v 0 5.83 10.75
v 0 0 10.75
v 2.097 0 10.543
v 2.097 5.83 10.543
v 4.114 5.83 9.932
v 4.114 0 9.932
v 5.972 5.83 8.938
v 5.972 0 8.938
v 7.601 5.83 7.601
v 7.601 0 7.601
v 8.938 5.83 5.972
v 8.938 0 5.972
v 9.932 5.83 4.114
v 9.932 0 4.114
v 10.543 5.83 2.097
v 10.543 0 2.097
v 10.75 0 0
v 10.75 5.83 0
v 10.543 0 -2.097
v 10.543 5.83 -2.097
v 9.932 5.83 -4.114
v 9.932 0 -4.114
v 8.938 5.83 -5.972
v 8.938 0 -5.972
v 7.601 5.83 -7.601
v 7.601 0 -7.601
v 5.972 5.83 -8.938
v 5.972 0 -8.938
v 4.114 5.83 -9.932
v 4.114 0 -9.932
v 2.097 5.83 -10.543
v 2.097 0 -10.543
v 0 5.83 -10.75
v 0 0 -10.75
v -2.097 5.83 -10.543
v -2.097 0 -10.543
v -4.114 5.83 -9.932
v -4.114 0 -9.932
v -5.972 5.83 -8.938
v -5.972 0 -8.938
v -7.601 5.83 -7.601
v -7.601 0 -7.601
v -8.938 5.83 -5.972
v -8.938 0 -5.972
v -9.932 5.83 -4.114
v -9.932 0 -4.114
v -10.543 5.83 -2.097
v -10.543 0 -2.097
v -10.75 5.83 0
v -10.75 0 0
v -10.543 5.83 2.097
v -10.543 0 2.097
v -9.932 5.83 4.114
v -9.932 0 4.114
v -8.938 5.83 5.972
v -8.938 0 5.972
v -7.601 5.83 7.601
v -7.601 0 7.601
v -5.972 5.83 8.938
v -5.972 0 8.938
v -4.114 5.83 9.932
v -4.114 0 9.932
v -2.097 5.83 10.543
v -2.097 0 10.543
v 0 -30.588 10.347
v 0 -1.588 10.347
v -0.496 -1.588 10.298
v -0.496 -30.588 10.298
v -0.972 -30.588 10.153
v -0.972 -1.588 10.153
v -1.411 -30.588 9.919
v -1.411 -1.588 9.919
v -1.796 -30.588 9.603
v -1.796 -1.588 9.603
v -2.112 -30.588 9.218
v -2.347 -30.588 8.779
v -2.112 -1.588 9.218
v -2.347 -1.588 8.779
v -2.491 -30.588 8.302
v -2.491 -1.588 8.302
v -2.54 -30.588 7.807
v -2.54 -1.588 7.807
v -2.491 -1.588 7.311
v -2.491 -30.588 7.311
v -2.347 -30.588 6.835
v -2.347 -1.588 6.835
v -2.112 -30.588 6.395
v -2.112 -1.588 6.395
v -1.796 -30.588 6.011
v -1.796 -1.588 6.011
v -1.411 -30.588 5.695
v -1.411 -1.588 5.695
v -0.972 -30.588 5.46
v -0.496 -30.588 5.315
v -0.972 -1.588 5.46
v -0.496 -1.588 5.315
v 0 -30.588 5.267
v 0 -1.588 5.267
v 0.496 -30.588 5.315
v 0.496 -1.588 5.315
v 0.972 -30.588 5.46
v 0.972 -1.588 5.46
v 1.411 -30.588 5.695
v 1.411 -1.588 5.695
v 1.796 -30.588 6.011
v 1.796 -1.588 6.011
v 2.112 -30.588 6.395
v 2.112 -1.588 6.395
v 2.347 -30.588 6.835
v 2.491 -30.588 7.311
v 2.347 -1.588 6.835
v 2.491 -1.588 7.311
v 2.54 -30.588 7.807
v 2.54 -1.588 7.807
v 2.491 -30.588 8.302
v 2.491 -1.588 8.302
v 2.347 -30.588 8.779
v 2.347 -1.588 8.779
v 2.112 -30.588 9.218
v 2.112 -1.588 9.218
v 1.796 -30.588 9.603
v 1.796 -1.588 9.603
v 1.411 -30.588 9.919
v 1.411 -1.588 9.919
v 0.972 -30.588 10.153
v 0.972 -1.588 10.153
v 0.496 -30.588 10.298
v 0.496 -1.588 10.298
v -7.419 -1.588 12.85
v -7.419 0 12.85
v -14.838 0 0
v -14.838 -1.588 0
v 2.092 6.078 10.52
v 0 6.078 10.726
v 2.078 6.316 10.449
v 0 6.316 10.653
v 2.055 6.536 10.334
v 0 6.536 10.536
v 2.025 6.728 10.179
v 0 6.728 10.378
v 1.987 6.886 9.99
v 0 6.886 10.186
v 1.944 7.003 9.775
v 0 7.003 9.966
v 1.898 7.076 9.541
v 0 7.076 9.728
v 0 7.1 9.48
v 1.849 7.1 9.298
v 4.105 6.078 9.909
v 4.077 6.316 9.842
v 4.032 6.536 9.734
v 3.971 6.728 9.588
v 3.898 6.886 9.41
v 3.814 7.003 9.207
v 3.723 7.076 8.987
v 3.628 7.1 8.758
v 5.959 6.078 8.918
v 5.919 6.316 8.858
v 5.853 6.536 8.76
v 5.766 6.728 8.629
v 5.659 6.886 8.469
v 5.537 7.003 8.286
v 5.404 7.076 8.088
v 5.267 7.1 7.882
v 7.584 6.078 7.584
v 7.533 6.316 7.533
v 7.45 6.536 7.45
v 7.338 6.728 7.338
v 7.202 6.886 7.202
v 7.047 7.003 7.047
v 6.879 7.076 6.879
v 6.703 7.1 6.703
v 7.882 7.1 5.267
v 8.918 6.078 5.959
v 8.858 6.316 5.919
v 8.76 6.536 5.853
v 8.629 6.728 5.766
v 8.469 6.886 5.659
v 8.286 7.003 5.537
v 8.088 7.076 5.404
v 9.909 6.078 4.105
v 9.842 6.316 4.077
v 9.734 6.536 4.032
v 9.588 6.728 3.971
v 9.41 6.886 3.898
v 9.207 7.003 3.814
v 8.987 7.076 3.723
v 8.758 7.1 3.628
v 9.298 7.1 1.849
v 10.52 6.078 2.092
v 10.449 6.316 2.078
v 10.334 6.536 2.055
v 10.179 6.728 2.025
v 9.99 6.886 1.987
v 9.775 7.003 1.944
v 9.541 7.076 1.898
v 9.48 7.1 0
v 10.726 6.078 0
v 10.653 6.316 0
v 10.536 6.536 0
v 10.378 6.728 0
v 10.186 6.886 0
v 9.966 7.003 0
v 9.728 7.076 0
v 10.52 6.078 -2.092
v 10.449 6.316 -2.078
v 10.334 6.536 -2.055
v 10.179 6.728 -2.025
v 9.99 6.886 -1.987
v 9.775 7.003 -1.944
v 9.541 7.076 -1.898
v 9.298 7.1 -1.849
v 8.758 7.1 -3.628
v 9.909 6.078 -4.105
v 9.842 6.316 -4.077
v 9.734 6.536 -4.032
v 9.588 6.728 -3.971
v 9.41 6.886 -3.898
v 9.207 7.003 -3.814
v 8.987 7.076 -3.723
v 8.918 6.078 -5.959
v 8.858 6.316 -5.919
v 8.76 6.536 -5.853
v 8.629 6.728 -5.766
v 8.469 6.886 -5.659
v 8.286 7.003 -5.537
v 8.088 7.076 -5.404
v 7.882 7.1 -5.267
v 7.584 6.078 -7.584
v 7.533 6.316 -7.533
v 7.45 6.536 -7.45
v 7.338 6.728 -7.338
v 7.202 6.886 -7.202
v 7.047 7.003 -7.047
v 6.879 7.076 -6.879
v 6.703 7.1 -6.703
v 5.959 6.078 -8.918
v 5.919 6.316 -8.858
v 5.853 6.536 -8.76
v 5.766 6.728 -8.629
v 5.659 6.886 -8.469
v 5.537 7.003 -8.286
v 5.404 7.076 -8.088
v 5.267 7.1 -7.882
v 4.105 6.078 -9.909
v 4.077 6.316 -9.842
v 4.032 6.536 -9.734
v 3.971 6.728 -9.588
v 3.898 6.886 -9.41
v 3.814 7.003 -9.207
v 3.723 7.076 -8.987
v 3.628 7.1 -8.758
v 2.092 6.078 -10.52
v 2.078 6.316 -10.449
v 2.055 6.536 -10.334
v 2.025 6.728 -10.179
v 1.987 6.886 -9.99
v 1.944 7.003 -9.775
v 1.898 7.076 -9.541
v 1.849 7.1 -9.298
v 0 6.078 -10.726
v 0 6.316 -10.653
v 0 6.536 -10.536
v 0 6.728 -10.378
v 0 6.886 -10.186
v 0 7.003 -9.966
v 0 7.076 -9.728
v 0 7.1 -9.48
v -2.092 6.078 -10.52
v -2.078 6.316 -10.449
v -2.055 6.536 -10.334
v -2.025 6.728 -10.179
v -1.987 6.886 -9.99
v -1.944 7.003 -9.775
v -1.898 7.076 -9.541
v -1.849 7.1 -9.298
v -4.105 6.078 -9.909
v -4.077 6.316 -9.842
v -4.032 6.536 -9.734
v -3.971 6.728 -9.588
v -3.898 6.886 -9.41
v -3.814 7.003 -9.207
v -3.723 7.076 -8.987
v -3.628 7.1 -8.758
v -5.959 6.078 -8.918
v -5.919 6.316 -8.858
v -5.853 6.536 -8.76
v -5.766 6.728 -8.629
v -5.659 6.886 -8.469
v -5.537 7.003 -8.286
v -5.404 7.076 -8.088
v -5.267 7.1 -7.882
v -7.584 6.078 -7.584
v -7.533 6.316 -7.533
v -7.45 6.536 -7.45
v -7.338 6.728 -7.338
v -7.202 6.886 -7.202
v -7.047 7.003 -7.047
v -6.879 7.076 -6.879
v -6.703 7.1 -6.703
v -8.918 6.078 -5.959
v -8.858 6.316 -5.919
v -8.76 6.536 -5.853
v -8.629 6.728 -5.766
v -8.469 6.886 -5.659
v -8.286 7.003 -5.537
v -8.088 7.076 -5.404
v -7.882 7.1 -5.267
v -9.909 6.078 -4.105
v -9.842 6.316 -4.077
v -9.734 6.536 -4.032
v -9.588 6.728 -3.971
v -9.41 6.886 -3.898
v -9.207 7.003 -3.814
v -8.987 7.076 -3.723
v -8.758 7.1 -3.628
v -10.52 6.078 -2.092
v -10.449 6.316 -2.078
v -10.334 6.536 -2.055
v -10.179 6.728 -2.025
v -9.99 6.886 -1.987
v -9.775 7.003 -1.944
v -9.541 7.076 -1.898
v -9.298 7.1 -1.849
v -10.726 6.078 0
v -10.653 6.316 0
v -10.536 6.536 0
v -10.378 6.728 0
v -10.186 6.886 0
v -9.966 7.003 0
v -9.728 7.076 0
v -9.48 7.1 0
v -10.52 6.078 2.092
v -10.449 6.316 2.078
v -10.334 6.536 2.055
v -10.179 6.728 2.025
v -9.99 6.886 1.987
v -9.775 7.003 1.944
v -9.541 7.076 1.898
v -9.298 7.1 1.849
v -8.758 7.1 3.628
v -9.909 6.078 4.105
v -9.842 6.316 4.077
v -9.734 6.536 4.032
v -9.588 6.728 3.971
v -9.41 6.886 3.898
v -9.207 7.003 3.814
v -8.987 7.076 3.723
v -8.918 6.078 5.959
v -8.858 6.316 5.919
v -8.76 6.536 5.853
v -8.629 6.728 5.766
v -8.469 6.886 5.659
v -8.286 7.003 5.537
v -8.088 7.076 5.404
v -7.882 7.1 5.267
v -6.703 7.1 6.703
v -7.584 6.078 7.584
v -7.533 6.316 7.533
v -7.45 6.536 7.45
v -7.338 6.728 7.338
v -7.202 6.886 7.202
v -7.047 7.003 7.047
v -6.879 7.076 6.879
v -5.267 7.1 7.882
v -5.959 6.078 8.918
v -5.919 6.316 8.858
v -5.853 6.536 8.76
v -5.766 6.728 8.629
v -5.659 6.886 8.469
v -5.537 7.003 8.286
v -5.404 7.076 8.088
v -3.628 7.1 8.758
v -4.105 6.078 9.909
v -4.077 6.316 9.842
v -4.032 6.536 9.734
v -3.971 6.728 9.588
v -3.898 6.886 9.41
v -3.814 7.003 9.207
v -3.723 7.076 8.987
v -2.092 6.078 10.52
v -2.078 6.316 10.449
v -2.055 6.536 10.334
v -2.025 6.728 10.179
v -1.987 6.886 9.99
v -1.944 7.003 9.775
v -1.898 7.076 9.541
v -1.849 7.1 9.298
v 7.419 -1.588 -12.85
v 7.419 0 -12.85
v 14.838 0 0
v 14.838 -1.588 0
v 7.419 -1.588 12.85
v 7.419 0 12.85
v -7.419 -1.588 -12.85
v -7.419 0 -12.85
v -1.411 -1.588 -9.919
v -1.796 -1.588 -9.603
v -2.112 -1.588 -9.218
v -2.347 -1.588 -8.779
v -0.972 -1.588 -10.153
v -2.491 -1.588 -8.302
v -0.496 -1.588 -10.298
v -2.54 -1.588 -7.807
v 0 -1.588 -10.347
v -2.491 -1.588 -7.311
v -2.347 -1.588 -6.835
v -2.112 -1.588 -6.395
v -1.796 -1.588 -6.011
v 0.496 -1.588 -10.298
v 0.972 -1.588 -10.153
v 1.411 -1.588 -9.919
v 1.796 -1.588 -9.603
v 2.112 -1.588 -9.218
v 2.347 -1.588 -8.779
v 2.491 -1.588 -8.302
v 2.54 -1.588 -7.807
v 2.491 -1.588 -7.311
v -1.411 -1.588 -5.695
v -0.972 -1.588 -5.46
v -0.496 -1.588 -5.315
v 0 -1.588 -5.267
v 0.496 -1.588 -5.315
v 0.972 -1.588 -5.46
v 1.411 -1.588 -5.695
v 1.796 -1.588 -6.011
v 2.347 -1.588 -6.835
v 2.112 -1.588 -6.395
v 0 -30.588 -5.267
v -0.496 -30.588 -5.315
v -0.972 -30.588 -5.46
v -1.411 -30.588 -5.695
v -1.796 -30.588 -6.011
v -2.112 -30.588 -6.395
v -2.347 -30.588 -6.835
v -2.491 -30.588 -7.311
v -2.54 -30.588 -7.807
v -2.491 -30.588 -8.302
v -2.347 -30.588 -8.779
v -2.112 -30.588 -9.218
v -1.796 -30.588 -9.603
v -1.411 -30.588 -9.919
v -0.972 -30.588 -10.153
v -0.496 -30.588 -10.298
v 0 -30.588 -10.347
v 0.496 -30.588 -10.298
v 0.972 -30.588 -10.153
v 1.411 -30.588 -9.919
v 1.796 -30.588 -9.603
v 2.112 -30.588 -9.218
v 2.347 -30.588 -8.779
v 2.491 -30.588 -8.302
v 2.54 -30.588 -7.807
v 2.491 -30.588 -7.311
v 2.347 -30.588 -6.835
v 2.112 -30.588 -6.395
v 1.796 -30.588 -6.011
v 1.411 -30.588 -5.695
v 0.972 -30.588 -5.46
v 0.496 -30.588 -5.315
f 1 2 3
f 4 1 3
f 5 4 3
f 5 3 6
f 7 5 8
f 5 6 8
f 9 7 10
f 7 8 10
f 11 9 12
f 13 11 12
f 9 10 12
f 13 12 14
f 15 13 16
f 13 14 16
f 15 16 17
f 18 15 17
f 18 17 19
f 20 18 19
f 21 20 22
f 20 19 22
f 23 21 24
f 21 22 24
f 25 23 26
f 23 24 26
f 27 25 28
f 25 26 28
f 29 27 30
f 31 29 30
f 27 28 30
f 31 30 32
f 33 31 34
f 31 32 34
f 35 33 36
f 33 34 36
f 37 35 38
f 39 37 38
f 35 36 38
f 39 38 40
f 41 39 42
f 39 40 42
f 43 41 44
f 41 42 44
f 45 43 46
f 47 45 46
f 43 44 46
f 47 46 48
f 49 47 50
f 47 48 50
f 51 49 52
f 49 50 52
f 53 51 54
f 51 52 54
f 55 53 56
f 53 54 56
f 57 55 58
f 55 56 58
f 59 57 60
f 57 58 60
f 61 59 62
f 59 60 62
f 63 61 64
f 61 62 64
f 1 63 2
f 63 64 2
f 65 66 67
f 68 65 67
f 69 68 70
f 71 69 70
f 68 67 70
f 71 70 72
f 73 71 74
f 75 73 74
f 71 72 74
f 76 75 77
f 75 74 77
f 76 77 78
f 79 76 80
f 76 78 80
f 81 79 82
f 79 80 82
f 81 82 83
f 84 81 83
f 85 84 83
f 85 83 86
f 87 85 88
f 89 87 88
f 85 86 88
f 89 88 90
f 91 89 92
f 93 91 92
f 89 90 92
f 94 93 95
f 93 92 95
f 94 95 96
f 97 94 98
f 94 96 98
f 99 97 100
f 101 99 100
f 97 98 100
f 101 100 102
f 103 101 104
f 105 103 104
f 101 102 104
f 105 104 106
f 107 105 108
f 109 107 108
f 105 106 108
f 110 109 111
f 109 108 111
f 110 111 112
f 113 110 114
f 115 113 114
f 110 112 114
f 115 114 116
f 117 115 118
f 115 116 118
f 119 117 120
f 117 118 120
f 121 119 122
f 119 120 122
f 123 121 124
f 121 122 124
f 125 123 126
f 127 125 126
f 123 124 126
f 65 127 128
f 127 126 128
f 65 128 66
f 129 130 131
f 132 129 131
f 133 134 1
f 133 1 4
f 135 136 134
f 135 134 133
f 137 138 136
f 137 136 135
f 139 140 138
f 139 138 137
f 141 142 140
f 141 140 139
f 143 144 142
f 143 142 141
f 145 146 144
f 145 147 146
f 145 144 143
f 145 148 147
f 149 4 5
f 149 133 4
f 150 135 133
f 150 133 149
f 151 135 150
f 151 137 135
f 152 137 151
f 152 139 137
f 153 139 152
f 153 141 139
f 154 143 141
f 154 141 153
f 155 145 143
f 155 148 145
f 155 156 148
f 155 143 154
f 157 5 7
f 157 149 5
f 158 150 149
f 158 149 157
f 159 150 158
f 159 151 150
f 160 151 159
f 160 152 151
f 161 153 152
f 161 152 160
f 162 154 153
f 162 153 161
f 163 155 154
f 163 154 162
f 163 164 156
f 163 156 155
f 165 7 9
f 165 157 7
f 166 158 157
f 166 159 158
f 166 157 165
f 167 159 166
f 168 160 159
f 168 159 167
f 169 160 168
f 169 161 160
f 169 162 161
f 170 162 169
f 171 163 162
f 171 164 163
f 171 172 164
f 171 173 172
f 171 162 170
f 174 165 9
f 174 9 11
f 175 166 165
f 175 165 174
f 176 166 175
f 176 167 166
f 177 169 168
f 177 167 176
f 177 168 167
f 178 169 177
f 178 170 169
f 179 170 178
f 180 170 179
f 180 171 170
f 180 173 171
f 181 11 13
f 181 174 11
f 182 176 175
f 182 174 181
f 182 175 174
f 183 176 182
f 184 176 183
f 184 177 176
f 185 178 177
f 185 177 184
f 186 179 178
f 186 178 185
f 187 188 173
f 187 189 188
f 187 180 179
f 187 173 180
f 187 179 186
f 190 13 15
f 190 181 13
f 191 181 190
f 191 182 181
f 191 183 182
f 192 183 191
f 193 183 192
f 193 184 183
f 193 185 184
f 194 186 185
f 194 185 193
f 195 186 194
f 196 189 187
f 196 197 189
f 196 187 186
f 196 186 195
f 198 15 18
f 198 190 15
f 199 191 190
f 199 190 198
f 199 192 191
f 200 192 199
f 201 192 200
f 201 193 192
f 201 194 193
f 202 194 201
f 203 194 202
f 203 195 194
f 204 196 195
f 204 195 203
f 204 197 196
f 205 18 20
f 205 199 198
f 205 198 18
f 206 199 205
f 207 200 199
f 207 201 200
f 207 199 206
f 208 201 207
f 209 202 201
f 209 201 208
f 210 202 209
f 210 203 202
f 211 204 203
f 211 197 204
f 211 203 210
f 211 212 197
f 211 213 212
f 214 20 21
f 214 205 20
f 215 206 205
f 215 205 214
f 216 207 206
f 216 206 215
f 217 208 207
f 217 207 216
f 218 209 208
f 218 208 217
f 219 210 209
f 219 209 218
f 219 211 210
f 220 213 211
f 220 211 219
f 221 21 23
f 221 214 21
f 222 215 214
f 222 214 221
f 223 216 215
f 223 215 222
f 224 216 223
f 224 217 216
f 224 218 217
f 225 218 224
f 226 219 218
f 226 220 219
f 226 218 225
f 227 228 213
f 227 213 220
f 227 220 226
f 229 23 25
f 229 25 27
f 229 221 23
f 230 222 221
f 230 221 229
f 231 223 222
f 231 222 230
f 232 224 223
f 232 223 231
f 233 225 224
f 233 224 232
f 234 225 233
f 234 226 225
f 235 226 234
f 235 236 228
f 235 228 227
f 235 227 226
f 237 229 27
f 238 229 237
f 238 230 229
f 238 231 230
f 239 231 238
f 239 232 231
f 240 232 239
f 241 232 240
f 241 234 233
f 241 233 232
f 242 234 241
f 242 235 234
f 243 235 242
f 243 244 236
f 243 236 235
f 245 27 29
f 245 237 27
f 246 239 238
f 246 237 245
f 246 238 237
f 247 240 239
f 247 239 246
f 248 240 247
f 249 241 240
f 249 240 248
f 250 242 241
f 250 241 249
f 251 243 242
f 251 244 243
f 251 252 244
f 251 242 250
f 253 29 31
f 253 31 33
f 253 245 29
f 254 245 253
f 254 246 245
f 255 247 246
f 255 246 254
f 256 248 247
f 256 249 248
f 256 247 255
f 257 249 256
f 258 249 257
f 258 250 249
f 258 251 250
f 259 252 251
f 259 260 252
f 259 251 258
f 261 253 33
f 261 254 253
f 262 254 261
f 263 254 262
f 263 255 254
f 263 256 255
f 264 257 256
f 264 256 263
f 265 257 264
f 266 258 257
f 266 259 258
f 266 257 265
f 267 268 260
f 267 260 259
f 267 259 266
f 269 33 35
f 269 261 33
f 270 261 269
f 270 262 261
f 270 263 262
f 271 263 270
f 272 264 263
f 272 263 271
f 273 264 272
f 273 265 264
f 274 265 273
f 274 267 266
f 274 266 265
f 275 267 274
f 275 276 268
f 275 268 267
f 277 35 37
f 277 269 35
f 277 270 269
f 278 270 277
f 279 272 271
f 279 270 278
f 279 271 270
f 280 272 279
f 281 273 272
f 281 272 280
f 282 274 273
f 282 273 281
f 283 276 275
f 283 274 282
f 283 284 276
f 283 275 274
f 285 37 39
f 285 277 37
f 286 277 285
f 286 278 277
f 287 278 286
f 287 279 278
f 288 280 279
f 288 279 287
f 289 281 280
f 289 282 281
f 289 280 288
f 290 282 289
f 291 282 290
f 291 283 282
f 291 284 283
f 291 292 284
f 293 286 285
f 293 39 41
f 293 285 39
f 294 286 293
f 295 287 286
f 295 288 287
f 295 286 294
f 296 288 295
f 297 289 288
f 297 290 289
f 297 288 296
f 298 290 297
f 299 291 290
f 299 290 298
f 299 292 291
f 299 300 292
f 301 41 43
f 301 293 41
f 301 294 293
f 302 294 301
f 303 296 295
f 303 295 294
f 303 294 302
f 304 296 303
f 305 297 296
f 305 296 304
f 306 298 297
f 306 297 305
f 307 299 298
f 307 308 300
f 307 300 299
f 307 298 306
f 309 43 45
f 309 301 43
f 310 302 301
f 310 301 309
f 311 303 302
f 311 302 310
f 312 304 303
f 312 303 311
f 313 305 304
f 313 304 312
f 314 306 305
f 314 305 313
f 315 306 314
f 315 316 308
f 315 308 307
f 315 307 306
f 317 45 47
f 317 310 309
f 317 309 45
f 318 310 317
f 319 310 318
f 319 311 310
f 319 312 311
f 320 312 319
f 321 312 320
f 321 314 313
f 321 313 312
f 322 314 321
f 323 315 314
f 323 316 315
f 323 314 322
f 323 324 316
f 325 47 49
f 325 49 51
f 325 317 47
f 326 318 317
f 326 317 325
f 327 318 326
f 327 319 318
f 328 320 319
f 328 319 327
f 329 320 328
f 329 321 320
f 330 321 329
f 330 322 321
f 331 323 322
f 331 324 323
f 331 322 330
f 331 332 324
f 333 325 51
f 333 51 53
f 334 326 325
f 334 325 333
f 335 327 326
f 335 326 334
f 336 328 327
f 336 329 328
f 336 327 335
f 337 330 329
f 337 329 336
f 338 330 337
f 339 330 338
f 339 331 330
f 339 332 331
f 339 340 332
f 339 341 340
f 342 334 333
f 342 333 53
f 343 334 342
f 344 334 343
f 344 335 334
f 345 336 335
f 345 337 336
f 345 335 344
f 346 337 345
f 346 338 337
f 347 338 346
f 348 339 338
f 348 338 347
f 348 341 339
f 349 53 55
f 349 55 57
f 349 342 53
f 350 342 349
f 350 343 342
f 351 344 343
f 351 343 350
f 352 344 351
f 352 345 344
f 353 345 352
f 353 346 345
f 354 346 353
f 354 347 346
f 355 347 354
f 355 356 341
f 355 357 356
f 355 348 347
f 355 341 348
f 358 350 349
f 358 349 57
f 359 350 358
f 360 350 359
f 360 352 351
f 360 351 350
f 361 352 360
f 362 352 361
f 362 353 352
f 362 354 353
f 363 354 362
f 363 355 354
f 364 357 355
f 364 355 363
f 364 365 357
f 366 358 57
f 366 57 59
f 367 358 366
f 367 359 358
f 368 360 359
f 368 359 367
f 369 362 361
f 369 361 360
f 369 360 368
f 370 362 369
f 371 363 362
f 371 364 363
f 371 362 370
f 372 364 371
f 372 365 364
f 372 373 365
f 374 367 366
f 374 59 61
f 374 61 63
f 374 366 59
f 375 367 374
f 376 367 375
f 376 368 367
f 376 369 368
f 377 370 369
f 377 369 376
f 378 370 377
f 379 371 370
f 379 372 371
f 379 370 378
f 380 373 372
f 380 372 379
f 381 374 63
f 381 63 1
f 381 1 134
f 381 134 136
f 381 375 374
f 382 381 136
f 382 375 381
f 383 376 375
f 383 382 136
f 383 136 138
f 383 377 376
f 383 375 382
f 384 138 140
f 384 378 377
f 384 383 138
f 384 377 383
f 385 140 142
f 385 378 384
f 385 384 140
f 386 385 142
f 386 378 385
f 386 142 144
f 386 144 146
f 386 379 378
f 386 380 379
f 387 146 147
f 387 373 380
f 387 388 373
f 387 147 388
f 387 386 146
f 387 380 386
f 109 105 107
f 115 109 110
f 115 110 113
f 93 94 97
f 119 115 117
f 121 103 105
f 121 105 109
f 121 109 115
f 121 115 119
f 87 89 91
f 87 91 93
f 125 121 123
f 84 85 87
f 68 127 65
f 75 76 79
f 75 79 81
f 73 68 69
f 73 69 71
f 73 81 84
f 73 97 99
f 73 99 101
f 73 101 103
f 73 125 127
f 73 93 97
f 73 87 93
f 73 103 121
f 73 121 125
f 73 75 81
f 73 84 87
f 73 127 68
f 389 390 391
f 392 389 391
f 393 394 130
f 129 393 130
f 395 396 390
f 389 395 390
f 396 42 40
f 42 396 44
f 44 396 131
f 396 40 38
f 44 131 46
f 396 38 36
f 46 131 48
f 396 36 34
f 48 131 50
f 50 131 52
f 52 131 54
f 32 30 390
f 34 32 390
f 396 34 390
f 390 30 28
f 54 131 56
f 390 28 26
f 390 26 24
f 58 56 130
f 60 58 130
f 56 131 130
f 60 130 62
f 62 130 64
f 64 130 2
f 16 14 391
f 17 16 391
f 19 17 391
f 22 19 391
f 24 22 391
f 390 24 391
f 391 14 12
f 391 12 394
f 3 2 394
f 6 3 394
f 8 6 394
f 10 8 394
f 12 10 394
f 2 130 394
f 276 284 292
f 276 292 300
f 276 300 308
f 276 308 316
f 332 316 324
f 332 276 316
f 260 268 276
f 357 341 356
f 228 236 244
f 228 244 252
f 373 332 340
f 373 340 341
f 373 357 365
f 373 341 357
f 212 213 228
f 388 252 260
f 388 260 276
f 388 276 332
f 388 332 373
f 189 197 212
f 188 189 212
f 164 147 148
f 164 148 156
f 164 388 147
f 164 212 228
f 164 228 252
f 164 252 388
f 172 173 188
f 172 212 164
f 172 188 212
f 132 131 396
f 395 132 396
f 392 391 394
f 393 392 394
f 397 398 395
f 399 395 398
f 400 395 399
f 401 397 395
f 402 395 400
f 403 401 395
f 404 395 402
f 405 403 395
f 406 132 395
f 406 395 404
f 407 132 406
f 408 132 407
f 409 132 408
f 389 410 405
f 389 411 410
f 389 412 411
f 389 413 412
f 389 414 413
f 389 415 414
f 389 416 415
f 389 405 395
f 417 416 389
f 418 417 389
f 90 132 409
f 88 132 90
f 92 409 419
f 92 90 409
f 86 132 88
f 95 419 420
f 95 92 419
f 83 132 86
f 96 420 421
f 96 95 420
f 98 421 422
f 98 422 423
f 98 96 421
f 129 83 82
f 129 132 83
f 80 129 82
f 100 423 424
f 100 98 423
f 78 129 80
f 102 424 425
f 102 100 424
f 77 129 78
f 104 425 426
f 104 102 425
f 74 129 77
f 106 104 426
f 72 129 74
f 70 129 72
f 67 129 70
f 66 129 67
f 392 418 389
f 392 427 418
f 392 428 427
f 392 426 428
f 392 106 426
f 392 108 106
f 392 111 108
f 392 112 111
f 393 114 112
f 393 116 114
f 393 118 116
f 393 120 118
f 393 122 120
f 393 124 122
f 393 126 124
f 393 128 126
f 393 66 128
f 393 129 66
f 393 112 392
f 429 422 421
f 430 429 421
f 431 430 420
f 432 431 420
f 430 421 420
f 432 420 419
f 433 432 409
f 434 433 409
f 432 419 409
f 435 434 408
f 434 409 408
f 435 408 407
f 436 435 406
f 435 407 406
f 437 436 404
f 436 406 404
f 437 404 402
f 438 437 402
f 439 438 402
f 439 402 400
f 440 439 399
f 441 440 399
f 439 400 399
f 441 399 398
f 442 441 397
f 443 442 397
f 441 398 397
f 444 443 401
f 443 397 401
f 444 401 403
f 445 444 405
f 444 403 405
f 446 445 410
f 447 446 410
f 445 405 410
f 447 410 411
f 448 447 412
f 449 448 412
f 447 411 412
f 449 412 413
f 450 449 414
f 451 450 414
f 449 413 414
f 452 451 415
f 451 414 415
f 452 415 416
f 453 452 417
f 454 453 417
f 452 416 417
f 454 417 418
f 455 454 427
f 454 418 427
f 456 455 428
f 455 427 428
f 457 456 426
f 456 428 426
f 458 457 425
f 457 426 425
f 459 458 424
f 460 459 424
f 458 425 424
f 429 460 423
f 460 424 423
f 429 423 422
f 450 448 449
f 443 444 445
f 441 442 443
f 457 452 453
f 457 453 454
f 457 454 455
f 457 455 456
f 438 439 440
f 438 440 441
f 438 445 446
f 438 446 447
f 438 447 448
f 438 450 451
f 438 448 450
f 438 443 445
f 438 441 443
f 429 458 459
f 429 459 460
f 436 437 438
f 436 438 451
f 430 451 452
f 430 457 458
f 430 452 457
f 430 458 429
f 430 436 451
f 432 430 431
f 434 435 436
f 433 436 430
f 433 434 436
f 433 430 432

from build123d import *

# Parameters (mm, degrees)
SKETCH1_R           = 10.75
BOSS_EXTRUDE1_DEPTH = 7.1
BOSS_EXTRUDE2_DEPTH = 1.5875
SKETCH3_R           = 2.54
BOSS_EXTRUDE3_DEPTH = 29
FILLET1_R           = 1.27


with BuildPart() as part:
    # Sketch1 → Boss-Extrude1 (new body)
    with BuildSketch(Plane(origin=(0, 0, 0), x_dir=(1, 0, 0), z_dir=(0, 1, 0))):
        with Locations(Location((0, 0, 0), (0, 0, 270))):
            Circle(SKETCH1_R)
    extrude(amount=BOSS_EXTRUDE1_DEPTH)

    # Sketch2 → Boss-Extrude2 (add)
    with BuildSketch(Plane.XZ):
        Polygon((-14.837901918, 0), (-7.418950959, -12.85), (7.418950959, -12.85), (14.837901918, 0), (7.418950959, 12.85), (-7.418950959, 12.85), align=None)
    extrude(amount=BOSS_EXTRUDE2_DEPTH)

    # Sketch3 → Boss-Extrude3 (add)
    with BuildSketch(Plane.XZ.offset(1.5875)):
        with Locations(Location((0, 7.80660503, 0), (0, 0, 90))):
            Circle(SKETCH3_R)
        with Locations(Location((0, -7.80660503, 0), (0, 0, 90))):
            Circle(SKETCH3_R)
    extrude(amount=BOSS_EXTRUDE3_DEPTH)

    # Fillet1
    fillet1_edges = [part.edges().sort_by_distance(p)[0] for p in [
        (0, 7.1, -10.75),
    ]]
    fillet(fillet1_edges, radius=FILLET1_R)


solid = part.part
